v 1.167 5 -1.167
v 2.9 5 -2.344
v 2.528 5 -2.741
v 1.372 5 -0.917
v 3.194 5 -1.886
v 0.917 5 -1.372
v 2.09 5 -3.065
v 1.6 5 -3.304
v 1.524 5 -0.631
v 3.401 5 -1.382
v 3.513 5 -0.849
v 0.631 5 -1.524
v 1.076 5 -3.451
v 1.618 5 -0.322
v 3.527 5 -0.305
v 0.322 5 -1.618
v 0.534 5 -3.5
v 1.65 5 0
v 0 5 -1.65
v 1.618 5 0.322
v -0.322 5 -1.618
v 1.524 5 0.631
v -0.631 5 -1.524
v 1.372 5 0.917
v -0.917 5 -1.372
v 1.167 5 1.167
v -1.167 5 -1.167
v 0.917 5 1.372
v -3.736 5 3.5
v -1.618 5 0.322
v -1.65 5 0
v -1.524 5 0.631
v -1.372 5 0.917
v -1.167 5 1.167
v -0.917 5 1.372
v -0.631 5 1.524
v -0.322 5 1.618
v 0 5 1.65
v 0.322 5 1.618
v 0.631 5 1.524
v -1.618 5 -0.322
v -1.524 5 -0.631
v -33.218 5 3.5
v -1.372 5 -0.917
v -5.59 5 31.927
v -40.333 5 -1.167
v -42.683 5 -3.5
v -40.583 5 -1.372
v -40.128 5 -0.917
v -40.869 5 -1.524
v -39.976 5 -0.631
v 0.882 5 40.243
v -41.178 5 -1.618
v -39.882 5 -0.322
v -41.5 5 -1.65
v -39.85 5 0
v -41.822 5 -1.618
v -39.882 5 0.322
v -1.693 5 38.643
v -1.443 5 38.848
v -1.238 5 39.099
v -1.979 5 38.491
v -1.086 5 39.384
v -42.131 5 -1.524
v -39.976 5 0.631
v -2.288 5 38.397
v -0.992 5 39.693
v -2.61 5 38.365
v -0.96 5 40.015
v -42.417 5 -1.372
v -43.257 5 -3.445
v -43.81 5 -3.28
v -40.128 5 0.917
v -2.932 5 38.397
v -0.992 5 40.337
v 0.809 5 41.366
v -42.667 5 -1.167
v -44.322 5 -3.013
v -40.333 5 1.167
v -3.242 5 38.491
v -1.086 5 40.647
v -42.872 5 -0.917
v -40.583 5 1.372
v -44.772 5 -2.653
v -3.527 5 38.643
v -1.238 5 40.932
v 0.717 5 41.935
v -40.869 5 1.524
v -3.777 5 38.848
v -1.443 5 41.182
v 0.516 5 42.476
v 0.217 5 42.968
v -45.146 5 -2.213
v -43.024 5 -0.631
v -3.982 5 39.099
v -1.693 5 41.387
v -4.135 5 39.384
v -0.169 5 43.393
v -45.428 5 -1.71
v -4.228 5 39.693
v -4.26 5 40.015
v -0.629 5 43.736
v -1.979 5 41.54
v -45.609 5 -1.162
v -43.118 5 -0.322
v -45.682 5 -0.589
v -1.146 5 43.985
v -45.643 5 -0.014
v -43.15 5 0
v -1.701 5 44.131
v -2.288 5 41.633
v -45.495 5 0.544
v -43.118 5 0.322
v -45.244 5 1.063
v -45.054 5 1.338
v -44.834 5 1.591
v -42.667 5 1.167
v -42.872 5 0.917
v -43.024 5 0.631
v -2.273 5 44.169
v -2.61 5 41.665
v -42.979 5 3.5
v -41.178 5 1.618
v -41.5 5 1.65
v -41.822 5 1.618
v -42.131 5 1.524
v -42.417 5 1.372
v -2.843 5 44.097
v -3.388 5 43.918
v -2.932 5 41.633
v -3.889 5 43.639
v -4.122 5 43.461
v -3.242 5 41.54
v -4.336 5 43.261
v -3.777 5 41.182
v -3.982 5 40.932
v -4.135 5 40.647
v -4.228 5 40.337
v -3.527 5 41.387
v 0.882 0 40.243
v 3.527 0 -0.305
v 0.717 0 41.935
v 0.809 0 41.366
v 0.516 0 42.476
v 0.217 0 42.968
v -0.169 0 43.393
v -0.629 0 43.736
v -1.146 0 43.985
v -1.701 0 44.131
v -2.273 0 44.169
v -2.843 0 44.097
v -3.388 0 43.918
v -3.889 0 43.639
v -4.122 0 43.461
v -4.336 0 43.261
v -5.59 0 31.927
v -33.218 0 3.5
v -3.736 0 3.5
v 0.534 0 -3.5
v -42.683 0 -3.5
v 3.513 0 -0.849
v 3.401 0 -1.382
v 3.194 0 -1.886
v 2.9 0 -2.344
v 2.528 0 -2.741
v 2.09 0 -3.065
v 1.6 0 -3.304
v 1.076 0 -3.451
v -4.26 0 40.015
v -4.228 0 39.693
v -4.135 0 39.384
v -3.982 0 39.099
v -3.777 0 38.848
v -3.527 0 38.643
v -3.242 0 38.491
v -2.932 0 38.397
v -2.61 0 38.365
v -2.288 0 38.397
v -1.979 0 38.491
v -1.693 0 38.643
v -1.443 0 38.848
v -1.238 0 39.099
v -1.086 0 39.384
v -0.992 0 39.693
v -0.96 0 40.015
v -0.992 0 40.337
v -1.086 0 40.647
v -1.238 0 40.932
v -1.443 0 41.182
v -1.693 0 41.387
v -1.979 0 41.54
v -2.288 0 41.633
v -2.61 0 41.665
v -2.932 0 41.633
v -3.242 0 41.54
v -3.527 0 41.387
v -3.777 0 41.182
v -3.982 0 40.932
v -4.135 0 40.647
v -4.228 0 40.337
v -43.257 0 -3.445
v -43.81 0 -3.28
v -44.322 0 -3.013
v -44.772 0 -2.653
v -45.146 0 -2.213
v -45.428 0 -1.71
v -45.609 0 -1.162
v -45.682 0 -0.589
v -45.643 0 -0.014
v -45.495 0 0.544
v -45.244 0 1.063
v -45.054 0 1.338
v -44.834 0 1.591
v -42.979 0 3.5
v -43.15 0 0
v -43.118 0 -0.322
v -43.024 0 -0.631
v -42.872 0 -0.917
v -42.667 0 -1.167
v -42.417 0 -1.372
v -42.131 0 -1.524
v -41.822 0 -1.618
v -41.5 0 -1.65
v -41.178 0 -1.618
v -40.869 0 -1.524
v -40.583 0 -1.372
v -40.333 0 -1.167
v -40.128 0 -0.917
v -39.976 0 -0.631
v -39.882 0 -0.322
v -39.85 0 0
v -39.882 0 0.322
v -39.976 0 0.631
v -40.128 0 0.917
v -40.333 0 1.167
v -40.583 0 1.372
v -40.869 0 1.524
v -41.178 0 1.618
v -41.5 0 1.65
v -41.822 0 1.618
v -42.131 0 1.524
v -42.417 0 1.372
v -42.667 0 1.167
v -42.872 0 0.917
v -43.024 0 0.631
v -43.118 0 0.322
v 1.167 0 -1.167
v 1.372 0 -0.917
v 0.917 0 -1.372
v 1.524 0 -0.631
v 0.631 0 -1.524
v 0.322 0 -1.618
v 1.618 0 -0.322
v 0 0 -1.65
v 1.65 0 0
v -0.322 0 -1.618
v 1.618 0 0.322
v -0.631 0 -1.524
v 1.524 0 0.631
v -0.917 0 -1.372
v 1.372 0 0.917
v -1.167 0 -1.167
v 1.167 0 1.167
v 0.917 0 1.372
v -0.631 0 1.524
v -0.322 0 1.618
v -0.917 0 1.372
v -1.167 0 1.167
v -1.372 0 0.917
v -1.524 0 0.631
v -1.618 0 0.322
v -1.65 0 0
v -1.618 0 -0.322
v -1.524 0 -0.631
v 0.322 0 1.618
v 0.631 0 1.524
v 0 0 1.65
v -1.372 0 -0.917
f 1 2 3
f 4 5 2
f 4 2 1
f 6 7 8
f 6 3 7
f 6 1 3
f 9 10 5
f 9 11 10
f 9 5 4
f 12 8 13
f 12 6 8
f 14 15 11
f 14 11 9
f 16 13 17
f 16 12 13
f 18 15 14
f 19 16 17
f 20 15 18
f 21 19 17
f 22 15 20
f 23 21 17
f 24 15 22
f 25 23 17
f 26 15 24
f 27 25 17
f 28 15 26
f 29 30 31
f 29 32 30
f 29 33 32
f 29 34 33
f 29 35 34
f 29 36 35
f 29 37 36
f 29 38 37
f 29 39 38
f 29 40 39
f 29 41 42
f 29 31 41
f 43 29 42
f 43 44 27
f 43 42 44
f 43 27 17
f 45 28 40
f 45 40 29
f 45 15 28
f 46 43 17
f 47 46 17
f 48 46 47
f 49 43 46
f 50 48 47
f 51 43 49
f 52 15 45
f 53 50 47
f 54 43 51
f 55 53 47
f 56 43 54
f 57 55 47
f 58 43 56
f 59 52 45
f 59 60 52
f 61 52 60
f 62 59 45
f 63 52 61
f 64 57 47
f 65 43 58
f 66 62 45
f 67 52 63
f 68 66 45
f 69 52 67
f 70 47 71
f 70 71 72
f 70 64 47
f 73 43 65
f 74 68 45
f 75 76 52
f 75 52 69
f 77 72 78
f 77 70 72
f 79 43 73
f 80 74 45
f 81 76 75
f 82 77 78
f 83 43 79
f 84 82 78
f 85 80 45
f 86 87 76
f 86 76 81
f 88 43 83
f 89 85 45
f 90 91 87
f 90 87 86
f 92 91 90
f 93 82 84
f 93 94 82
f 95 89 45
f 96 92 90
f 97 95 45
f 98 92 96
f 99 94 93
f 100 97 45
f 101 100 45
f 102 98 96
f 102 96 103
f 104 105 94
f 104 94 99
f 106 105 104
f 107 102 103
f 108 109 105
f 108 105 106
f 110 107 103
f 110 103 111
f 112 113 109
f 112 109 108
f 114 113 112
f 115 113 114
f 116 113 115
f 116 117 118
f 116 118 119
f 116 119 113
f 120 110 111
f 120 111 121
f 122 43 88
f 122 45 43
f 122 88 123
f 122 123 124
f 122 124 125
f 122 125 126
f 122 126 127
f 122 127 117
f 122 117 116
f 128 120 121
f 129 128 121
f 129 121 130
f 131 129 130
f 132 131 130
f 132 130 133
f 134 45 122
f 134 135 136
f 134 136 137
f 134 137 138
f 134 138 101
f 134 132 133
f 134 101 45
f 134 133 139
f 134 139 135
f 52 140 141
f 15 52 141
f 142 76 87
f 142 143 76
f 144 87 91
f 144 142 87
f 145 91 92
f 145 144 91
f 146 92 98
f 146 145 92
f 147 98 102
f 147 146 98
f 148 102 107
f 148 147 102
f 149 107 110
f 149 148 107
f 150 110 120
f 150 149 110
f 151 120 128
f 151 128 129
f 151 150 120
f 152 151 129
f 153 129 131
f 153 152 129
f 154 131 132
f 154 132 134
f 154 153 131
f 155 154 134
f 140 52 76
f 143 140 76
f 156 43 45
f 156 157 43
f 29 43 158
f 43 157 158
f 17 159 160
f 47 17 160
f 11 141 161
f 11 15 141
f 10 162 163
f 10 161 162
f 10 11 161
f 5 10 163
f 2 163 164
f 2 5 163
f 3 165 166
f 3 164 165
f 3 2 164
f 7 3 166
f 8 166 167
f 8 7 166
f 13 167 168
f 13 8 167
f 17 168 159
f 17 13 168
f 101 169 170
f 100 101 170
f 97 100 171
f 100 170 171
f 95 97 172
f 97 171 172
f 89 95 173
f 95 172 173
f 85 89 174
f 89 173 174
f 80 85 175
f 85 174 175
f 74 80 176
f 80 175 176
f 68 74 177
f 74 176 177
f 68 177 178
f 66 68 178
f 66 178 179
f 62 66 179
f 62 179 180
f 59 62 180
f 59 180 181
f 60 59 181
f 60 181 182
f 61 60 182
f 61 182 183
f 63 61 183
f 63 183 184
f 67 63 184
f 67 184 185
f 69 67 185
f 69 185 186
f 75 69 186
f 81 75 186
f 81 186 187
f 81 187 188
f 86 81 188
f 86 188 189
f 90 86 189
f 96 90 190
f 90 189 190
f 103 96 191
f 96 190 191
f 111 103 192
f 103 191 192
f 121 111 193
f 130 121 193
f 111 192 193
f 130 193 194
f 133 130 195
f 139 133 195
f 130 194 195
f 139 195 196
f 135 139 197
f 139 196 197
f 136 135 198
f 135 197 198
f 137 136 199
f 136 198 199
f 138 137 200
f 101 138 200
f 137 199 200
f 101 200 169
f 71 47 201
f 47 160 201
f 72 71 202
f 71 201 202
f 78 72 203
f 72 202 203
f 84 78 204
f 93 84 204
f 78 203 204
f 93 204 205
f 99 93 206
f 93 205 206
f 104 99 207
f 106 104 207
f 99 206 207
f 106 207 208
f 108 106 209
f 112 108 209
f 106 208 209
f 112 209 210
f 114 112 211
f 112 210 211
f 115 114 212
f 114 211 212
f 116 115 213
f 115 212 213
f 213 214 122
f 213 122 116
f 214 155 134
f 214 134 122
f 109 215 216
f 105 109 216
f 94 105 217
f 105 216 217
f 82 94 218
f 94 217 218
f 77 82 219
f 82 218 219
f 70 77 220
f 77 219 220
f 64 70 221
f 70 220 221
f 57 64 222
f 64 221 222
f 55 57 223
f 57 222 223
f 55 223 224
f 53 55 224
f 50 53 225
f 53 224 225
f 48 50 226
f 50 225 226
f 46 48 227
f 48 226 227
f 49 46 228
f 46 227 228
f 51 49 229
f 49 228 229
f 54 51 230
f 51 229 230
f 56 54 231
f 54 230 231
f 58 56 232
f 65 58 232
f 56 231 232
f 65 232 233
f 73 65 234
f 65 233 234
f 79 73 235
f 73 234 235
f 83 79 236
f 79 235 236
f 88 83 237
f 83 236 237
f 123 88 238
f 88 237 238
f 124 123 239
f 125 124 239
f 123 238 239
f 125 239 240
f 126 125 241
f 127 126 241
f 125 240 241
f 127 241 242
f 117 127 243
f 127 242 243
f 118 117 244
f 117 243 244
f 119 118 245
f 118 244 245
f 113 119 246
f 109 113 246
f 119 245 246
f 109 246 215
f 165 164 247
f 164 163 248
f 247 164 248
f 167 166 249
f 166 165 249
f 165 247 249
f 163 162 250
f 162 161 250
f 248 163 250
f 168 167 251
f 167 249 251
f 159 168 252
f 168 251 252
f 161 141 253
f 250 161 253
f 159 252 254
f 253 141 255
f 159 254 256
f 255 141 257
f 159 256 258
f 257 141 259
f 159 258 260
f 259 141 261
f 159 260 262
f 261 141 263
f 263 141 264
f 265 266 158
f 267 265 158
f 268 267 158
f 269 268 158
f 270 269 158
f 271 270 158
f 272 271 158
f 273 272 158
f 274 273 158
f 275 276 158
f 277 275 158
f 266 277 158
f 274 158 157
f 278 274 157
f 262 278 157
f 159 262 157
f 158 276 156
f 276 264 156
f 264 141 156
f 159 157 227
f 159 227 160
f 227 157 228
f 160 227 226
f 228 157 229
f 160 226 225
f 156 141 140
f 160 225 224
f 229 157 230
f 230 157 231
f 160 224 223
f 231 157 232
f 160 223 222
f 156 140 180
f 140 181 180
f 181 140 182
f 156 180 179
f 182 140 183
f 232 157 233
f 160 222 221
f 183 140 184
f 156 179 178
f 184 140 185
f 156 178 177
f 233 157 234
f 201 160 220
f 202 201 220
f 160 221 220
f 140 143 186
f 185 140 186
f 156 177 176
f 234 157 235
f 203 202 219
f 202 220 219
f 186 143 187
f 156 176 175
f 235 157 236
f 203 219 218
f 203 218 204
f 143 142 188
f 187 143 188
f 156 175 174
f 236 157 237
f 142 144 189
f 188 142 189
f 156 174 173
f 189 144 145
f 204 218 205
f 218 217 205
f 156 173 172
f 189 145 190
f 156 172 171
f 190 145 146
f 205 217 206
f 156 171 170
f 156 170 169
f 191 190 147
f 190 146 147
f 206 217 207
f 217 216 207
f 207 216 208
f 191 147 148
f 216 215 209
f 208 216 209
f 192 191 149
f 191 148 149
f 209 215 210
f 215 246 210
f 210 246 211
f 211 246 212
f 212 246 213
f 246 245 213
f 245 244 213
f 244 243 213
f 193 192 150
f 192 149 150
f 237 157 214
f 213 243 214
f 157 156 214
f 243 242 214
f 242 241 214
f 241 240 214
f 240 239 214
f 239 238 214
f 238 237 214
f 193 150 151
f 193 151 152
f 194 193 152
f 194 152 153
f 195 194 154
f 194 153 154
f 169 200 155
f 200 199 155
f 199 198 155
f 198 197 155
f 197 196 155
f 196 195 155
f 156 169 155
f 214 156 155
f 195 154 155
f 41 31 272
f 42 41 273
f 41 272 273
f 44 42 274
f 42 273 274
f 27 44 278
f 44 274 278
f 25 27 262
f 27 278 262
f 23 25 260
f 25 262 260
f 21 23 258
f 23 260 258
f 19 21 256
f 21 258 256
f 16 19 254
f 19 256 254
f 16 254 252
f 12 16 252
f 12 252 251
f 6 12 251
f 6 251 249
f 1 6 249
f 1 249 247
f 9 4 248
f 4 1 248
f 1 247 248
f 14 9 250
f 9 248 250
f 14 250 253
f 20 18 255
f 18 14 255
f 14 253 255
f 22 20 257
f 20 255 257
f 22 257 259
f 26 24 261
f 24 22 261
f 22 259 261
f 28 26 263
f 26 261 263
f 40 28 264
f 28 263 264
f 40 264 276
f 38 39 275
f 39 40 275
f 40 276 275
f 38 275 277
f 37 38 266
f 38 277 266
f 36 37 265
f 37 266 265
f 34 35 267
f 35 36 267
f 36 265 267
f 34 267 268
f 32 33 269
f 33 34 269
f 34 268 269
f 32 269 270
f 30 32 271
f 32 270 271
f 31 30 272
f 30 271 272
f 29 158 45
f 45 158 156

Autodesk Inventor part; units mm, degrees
ref_plane "YZ Plane" through (0, 0, 0) normal (1, 0, 0) x (0, 1, 0)
ref_plane "XZ Plane" through (0, 0, 0) normal (0, 1, 0) x (-1, 0, 0)
ref_plane "XY Plane" through (0, 0, 0) normal (0, 0, 1) x (1, 0, 0)
sketch "Sketch1" plane through (0, 0, 0) normal (0, 1, 0) x (-1, 0, 0)
  line L0 (0, 0) -> (41.5, 0)
  line L1 (41.5, 0) -> (2.6101, 40.0152)
  line L2 (2.6101, 40.0152) -> (0, 0)
  line L3 (-38.7898, 77.591) -> (-33.77, 82.4696)
  line L4 (-33.77, 82.4696) -> (44.0099, 2.4393)
  line L5 (44.0099, 2.4393) -> (38.9901, -2.4393)
  line L6 (38.9901, -2.4393) -> (-38.7898, 77.591)
  line L7 (-38.7898, 77.591) -> (44.0099, 2.4393) construction
  line L8 (-33.77, 82.4696) -> (38.9901, -2.4393) construction
  line L9 (83, -3.5) -> (83, 3.5)
  line L10 (83, 3.5) -> (0, 3.5)
  line L11 (0, 3.5) -> (0, -3.5)
  line L12 (0, -3.5) -> (83, -3.5)
  line L13 (83, -3.5) -> (0, 3.5) construction
  line L14 (83, 3.5) -> (0, -3.5) construction
  line L15 (-6.1026, -39.7873) -> (0.8825, -40.243)
  line L16 (0.8825, -40.243) -> (6.1026, 39.7873)
  line L17 (6.1026, 39.7873) -> (-0.8825, 40.243)
  line L18 (-0.8825, 40.243) -> (-6.1026, -39.7873)
  line L19 (-6.1026, -39.7873) -> (6.1026, 39.7873) construction
  line L20 (0.8825, -40.243) -> (-0.8825, 40.243) construction
  circle A0 centre (0, 0) radius 1.65
  circle A1 centre (2.6101, 40.0152) radius 1.65
  circle A2 centre (41.5, 0) radius 1.65
  line L21 (2.6101, 40.0152) -> (-2.6009, 40.355)
  line L22 (-1.2742, 34.2377) -> (-0.3698, 48.1031)
  line L23 (-0.3698, 48.1031) -> (-5.0836, 42.9096)
  line L24 (-2.6009, 40.355) -> (2.1129, 45.5486)
  line L25 (6.5967, -3.5) -> (-3.7357, -3.5)
  line L26 (10.4211, 3.5) -> (-3.2791, 3.5)
  line L27 (44.9726, 3.5) -> (44.9726, -3.5731)
  point P0 (33.2178, 3.5)
  point P1 (3.7357, 3.5)
  point P2 (5.5899, 31.9272)
  point P3 (42.9791, 3.5)
  point P4 (-0.7416, 42.4036)
  point P5 (44.9726, -3.5)
  dimension "d0" = 41.5
  dimension "d1" = 55.8
  dimension "d2" = 45.817
  dimension "d3" = 7
  dimension "d4" = 7
  dimension "d5" = 7
  dimension "d6" = 3.3
  dimension "d7" = 3.3
  dimension "d8" = 3.3
extrude "Extrusion1" add sketch "Sketch1" along normal blind 5 contours A0 L2 L10 L16 L0 | L0 L16 L12 L11 A0 | A0 L11 L10 L2 | A0 L11 L25 L18 L26 | L16 L10 L6 L0 | L0 L6 L5 A2 L4 L10 L27 L12 L16 | L10 L26 L18 L6 L2 | L2 L6 L16 L10 | L6 L10 L1 A2 L0 | L0 A2 L5 L6 | L6 L18 L17 A1 L2 | L2 A1 L1 L16 L6 | L6 L16 L1 L10 | L1 L10 L4 L5 A2 | L1 L16 L17 A1 L22 L24 L4 L10 | L1 A1 L17 L16
sketch "Sketch2" plane through (0, 5, 0) normal (0, 1, 0) x (1, 0, 0)
  line L0 (-42.9791, -3.5) -> (-2.1129, -45.5486) projected
  line L1 (-41.9322, -4.5771) -> (-44.9726, -1.4485)
  line L2 (-44.9726, 3.5) -> (-44.9726, -3.5) projected
  line L3 (-41.9322, -4.5771) -> (-37.5696, -4.5771) construction
  line L4 (-44.9726, -1.4485) -> (-44.9726, -3.5)
  line L5 (-44.9726, -3.5) -> (-42.9791, -3.5)
  point P0 (0, 0)
  dimension "d11" = 134.18
extrude "Extrusion2" cut sketch "Sketch2" against normal blind 10
sketch "Sketch3" plane through (0, 5, 0) normal (0, 1, 0) x (1, 0, 0)
  line L0 (-44.9726, -1.4485) -> (-41.9322, -4.5771) projected
  line L1 (-44.9726, 3.5) -> (-44.9726, -1.4485)
  line L2 (-44.9726, -1.4485) -> (-44.9726, 3.5)
  line L3 (-44.9726, 3.5) -> (-53.5355, 3.5)
  line L4 (-41.9322, -4.5771) -> (-49.7814, 3.5)
  line L5 (-41.9322, -4.5771) -> (-2.1129, -45.5486) projected
  line L6 (-6.7195, -40.8087) -> (1.7936, -49.5681)
  line L7 (0.7416, -42.4036) -> (3.7357, 3.5) projected
  line L8 (0.9497, -39.2136) -> (0.3698, -48.1031)
  line L9 (-2.1129, -45.5486) -> (0.7416, -42.4036) projected
  line L10 (-2.1129, -45.5486) -> (0.7416, -42.4036)
  point P0 (0, 0)
extrude "Extrusion3" add sketch "Sketch3" against normal blind 5
fillet "Fillet1" radius 3 3 edges at (0.3698, 2.5, 48.1031) (-49.7814, 2.5, -3.5) (3.7357, 2.5, -3.5)
properties part number "bde"
